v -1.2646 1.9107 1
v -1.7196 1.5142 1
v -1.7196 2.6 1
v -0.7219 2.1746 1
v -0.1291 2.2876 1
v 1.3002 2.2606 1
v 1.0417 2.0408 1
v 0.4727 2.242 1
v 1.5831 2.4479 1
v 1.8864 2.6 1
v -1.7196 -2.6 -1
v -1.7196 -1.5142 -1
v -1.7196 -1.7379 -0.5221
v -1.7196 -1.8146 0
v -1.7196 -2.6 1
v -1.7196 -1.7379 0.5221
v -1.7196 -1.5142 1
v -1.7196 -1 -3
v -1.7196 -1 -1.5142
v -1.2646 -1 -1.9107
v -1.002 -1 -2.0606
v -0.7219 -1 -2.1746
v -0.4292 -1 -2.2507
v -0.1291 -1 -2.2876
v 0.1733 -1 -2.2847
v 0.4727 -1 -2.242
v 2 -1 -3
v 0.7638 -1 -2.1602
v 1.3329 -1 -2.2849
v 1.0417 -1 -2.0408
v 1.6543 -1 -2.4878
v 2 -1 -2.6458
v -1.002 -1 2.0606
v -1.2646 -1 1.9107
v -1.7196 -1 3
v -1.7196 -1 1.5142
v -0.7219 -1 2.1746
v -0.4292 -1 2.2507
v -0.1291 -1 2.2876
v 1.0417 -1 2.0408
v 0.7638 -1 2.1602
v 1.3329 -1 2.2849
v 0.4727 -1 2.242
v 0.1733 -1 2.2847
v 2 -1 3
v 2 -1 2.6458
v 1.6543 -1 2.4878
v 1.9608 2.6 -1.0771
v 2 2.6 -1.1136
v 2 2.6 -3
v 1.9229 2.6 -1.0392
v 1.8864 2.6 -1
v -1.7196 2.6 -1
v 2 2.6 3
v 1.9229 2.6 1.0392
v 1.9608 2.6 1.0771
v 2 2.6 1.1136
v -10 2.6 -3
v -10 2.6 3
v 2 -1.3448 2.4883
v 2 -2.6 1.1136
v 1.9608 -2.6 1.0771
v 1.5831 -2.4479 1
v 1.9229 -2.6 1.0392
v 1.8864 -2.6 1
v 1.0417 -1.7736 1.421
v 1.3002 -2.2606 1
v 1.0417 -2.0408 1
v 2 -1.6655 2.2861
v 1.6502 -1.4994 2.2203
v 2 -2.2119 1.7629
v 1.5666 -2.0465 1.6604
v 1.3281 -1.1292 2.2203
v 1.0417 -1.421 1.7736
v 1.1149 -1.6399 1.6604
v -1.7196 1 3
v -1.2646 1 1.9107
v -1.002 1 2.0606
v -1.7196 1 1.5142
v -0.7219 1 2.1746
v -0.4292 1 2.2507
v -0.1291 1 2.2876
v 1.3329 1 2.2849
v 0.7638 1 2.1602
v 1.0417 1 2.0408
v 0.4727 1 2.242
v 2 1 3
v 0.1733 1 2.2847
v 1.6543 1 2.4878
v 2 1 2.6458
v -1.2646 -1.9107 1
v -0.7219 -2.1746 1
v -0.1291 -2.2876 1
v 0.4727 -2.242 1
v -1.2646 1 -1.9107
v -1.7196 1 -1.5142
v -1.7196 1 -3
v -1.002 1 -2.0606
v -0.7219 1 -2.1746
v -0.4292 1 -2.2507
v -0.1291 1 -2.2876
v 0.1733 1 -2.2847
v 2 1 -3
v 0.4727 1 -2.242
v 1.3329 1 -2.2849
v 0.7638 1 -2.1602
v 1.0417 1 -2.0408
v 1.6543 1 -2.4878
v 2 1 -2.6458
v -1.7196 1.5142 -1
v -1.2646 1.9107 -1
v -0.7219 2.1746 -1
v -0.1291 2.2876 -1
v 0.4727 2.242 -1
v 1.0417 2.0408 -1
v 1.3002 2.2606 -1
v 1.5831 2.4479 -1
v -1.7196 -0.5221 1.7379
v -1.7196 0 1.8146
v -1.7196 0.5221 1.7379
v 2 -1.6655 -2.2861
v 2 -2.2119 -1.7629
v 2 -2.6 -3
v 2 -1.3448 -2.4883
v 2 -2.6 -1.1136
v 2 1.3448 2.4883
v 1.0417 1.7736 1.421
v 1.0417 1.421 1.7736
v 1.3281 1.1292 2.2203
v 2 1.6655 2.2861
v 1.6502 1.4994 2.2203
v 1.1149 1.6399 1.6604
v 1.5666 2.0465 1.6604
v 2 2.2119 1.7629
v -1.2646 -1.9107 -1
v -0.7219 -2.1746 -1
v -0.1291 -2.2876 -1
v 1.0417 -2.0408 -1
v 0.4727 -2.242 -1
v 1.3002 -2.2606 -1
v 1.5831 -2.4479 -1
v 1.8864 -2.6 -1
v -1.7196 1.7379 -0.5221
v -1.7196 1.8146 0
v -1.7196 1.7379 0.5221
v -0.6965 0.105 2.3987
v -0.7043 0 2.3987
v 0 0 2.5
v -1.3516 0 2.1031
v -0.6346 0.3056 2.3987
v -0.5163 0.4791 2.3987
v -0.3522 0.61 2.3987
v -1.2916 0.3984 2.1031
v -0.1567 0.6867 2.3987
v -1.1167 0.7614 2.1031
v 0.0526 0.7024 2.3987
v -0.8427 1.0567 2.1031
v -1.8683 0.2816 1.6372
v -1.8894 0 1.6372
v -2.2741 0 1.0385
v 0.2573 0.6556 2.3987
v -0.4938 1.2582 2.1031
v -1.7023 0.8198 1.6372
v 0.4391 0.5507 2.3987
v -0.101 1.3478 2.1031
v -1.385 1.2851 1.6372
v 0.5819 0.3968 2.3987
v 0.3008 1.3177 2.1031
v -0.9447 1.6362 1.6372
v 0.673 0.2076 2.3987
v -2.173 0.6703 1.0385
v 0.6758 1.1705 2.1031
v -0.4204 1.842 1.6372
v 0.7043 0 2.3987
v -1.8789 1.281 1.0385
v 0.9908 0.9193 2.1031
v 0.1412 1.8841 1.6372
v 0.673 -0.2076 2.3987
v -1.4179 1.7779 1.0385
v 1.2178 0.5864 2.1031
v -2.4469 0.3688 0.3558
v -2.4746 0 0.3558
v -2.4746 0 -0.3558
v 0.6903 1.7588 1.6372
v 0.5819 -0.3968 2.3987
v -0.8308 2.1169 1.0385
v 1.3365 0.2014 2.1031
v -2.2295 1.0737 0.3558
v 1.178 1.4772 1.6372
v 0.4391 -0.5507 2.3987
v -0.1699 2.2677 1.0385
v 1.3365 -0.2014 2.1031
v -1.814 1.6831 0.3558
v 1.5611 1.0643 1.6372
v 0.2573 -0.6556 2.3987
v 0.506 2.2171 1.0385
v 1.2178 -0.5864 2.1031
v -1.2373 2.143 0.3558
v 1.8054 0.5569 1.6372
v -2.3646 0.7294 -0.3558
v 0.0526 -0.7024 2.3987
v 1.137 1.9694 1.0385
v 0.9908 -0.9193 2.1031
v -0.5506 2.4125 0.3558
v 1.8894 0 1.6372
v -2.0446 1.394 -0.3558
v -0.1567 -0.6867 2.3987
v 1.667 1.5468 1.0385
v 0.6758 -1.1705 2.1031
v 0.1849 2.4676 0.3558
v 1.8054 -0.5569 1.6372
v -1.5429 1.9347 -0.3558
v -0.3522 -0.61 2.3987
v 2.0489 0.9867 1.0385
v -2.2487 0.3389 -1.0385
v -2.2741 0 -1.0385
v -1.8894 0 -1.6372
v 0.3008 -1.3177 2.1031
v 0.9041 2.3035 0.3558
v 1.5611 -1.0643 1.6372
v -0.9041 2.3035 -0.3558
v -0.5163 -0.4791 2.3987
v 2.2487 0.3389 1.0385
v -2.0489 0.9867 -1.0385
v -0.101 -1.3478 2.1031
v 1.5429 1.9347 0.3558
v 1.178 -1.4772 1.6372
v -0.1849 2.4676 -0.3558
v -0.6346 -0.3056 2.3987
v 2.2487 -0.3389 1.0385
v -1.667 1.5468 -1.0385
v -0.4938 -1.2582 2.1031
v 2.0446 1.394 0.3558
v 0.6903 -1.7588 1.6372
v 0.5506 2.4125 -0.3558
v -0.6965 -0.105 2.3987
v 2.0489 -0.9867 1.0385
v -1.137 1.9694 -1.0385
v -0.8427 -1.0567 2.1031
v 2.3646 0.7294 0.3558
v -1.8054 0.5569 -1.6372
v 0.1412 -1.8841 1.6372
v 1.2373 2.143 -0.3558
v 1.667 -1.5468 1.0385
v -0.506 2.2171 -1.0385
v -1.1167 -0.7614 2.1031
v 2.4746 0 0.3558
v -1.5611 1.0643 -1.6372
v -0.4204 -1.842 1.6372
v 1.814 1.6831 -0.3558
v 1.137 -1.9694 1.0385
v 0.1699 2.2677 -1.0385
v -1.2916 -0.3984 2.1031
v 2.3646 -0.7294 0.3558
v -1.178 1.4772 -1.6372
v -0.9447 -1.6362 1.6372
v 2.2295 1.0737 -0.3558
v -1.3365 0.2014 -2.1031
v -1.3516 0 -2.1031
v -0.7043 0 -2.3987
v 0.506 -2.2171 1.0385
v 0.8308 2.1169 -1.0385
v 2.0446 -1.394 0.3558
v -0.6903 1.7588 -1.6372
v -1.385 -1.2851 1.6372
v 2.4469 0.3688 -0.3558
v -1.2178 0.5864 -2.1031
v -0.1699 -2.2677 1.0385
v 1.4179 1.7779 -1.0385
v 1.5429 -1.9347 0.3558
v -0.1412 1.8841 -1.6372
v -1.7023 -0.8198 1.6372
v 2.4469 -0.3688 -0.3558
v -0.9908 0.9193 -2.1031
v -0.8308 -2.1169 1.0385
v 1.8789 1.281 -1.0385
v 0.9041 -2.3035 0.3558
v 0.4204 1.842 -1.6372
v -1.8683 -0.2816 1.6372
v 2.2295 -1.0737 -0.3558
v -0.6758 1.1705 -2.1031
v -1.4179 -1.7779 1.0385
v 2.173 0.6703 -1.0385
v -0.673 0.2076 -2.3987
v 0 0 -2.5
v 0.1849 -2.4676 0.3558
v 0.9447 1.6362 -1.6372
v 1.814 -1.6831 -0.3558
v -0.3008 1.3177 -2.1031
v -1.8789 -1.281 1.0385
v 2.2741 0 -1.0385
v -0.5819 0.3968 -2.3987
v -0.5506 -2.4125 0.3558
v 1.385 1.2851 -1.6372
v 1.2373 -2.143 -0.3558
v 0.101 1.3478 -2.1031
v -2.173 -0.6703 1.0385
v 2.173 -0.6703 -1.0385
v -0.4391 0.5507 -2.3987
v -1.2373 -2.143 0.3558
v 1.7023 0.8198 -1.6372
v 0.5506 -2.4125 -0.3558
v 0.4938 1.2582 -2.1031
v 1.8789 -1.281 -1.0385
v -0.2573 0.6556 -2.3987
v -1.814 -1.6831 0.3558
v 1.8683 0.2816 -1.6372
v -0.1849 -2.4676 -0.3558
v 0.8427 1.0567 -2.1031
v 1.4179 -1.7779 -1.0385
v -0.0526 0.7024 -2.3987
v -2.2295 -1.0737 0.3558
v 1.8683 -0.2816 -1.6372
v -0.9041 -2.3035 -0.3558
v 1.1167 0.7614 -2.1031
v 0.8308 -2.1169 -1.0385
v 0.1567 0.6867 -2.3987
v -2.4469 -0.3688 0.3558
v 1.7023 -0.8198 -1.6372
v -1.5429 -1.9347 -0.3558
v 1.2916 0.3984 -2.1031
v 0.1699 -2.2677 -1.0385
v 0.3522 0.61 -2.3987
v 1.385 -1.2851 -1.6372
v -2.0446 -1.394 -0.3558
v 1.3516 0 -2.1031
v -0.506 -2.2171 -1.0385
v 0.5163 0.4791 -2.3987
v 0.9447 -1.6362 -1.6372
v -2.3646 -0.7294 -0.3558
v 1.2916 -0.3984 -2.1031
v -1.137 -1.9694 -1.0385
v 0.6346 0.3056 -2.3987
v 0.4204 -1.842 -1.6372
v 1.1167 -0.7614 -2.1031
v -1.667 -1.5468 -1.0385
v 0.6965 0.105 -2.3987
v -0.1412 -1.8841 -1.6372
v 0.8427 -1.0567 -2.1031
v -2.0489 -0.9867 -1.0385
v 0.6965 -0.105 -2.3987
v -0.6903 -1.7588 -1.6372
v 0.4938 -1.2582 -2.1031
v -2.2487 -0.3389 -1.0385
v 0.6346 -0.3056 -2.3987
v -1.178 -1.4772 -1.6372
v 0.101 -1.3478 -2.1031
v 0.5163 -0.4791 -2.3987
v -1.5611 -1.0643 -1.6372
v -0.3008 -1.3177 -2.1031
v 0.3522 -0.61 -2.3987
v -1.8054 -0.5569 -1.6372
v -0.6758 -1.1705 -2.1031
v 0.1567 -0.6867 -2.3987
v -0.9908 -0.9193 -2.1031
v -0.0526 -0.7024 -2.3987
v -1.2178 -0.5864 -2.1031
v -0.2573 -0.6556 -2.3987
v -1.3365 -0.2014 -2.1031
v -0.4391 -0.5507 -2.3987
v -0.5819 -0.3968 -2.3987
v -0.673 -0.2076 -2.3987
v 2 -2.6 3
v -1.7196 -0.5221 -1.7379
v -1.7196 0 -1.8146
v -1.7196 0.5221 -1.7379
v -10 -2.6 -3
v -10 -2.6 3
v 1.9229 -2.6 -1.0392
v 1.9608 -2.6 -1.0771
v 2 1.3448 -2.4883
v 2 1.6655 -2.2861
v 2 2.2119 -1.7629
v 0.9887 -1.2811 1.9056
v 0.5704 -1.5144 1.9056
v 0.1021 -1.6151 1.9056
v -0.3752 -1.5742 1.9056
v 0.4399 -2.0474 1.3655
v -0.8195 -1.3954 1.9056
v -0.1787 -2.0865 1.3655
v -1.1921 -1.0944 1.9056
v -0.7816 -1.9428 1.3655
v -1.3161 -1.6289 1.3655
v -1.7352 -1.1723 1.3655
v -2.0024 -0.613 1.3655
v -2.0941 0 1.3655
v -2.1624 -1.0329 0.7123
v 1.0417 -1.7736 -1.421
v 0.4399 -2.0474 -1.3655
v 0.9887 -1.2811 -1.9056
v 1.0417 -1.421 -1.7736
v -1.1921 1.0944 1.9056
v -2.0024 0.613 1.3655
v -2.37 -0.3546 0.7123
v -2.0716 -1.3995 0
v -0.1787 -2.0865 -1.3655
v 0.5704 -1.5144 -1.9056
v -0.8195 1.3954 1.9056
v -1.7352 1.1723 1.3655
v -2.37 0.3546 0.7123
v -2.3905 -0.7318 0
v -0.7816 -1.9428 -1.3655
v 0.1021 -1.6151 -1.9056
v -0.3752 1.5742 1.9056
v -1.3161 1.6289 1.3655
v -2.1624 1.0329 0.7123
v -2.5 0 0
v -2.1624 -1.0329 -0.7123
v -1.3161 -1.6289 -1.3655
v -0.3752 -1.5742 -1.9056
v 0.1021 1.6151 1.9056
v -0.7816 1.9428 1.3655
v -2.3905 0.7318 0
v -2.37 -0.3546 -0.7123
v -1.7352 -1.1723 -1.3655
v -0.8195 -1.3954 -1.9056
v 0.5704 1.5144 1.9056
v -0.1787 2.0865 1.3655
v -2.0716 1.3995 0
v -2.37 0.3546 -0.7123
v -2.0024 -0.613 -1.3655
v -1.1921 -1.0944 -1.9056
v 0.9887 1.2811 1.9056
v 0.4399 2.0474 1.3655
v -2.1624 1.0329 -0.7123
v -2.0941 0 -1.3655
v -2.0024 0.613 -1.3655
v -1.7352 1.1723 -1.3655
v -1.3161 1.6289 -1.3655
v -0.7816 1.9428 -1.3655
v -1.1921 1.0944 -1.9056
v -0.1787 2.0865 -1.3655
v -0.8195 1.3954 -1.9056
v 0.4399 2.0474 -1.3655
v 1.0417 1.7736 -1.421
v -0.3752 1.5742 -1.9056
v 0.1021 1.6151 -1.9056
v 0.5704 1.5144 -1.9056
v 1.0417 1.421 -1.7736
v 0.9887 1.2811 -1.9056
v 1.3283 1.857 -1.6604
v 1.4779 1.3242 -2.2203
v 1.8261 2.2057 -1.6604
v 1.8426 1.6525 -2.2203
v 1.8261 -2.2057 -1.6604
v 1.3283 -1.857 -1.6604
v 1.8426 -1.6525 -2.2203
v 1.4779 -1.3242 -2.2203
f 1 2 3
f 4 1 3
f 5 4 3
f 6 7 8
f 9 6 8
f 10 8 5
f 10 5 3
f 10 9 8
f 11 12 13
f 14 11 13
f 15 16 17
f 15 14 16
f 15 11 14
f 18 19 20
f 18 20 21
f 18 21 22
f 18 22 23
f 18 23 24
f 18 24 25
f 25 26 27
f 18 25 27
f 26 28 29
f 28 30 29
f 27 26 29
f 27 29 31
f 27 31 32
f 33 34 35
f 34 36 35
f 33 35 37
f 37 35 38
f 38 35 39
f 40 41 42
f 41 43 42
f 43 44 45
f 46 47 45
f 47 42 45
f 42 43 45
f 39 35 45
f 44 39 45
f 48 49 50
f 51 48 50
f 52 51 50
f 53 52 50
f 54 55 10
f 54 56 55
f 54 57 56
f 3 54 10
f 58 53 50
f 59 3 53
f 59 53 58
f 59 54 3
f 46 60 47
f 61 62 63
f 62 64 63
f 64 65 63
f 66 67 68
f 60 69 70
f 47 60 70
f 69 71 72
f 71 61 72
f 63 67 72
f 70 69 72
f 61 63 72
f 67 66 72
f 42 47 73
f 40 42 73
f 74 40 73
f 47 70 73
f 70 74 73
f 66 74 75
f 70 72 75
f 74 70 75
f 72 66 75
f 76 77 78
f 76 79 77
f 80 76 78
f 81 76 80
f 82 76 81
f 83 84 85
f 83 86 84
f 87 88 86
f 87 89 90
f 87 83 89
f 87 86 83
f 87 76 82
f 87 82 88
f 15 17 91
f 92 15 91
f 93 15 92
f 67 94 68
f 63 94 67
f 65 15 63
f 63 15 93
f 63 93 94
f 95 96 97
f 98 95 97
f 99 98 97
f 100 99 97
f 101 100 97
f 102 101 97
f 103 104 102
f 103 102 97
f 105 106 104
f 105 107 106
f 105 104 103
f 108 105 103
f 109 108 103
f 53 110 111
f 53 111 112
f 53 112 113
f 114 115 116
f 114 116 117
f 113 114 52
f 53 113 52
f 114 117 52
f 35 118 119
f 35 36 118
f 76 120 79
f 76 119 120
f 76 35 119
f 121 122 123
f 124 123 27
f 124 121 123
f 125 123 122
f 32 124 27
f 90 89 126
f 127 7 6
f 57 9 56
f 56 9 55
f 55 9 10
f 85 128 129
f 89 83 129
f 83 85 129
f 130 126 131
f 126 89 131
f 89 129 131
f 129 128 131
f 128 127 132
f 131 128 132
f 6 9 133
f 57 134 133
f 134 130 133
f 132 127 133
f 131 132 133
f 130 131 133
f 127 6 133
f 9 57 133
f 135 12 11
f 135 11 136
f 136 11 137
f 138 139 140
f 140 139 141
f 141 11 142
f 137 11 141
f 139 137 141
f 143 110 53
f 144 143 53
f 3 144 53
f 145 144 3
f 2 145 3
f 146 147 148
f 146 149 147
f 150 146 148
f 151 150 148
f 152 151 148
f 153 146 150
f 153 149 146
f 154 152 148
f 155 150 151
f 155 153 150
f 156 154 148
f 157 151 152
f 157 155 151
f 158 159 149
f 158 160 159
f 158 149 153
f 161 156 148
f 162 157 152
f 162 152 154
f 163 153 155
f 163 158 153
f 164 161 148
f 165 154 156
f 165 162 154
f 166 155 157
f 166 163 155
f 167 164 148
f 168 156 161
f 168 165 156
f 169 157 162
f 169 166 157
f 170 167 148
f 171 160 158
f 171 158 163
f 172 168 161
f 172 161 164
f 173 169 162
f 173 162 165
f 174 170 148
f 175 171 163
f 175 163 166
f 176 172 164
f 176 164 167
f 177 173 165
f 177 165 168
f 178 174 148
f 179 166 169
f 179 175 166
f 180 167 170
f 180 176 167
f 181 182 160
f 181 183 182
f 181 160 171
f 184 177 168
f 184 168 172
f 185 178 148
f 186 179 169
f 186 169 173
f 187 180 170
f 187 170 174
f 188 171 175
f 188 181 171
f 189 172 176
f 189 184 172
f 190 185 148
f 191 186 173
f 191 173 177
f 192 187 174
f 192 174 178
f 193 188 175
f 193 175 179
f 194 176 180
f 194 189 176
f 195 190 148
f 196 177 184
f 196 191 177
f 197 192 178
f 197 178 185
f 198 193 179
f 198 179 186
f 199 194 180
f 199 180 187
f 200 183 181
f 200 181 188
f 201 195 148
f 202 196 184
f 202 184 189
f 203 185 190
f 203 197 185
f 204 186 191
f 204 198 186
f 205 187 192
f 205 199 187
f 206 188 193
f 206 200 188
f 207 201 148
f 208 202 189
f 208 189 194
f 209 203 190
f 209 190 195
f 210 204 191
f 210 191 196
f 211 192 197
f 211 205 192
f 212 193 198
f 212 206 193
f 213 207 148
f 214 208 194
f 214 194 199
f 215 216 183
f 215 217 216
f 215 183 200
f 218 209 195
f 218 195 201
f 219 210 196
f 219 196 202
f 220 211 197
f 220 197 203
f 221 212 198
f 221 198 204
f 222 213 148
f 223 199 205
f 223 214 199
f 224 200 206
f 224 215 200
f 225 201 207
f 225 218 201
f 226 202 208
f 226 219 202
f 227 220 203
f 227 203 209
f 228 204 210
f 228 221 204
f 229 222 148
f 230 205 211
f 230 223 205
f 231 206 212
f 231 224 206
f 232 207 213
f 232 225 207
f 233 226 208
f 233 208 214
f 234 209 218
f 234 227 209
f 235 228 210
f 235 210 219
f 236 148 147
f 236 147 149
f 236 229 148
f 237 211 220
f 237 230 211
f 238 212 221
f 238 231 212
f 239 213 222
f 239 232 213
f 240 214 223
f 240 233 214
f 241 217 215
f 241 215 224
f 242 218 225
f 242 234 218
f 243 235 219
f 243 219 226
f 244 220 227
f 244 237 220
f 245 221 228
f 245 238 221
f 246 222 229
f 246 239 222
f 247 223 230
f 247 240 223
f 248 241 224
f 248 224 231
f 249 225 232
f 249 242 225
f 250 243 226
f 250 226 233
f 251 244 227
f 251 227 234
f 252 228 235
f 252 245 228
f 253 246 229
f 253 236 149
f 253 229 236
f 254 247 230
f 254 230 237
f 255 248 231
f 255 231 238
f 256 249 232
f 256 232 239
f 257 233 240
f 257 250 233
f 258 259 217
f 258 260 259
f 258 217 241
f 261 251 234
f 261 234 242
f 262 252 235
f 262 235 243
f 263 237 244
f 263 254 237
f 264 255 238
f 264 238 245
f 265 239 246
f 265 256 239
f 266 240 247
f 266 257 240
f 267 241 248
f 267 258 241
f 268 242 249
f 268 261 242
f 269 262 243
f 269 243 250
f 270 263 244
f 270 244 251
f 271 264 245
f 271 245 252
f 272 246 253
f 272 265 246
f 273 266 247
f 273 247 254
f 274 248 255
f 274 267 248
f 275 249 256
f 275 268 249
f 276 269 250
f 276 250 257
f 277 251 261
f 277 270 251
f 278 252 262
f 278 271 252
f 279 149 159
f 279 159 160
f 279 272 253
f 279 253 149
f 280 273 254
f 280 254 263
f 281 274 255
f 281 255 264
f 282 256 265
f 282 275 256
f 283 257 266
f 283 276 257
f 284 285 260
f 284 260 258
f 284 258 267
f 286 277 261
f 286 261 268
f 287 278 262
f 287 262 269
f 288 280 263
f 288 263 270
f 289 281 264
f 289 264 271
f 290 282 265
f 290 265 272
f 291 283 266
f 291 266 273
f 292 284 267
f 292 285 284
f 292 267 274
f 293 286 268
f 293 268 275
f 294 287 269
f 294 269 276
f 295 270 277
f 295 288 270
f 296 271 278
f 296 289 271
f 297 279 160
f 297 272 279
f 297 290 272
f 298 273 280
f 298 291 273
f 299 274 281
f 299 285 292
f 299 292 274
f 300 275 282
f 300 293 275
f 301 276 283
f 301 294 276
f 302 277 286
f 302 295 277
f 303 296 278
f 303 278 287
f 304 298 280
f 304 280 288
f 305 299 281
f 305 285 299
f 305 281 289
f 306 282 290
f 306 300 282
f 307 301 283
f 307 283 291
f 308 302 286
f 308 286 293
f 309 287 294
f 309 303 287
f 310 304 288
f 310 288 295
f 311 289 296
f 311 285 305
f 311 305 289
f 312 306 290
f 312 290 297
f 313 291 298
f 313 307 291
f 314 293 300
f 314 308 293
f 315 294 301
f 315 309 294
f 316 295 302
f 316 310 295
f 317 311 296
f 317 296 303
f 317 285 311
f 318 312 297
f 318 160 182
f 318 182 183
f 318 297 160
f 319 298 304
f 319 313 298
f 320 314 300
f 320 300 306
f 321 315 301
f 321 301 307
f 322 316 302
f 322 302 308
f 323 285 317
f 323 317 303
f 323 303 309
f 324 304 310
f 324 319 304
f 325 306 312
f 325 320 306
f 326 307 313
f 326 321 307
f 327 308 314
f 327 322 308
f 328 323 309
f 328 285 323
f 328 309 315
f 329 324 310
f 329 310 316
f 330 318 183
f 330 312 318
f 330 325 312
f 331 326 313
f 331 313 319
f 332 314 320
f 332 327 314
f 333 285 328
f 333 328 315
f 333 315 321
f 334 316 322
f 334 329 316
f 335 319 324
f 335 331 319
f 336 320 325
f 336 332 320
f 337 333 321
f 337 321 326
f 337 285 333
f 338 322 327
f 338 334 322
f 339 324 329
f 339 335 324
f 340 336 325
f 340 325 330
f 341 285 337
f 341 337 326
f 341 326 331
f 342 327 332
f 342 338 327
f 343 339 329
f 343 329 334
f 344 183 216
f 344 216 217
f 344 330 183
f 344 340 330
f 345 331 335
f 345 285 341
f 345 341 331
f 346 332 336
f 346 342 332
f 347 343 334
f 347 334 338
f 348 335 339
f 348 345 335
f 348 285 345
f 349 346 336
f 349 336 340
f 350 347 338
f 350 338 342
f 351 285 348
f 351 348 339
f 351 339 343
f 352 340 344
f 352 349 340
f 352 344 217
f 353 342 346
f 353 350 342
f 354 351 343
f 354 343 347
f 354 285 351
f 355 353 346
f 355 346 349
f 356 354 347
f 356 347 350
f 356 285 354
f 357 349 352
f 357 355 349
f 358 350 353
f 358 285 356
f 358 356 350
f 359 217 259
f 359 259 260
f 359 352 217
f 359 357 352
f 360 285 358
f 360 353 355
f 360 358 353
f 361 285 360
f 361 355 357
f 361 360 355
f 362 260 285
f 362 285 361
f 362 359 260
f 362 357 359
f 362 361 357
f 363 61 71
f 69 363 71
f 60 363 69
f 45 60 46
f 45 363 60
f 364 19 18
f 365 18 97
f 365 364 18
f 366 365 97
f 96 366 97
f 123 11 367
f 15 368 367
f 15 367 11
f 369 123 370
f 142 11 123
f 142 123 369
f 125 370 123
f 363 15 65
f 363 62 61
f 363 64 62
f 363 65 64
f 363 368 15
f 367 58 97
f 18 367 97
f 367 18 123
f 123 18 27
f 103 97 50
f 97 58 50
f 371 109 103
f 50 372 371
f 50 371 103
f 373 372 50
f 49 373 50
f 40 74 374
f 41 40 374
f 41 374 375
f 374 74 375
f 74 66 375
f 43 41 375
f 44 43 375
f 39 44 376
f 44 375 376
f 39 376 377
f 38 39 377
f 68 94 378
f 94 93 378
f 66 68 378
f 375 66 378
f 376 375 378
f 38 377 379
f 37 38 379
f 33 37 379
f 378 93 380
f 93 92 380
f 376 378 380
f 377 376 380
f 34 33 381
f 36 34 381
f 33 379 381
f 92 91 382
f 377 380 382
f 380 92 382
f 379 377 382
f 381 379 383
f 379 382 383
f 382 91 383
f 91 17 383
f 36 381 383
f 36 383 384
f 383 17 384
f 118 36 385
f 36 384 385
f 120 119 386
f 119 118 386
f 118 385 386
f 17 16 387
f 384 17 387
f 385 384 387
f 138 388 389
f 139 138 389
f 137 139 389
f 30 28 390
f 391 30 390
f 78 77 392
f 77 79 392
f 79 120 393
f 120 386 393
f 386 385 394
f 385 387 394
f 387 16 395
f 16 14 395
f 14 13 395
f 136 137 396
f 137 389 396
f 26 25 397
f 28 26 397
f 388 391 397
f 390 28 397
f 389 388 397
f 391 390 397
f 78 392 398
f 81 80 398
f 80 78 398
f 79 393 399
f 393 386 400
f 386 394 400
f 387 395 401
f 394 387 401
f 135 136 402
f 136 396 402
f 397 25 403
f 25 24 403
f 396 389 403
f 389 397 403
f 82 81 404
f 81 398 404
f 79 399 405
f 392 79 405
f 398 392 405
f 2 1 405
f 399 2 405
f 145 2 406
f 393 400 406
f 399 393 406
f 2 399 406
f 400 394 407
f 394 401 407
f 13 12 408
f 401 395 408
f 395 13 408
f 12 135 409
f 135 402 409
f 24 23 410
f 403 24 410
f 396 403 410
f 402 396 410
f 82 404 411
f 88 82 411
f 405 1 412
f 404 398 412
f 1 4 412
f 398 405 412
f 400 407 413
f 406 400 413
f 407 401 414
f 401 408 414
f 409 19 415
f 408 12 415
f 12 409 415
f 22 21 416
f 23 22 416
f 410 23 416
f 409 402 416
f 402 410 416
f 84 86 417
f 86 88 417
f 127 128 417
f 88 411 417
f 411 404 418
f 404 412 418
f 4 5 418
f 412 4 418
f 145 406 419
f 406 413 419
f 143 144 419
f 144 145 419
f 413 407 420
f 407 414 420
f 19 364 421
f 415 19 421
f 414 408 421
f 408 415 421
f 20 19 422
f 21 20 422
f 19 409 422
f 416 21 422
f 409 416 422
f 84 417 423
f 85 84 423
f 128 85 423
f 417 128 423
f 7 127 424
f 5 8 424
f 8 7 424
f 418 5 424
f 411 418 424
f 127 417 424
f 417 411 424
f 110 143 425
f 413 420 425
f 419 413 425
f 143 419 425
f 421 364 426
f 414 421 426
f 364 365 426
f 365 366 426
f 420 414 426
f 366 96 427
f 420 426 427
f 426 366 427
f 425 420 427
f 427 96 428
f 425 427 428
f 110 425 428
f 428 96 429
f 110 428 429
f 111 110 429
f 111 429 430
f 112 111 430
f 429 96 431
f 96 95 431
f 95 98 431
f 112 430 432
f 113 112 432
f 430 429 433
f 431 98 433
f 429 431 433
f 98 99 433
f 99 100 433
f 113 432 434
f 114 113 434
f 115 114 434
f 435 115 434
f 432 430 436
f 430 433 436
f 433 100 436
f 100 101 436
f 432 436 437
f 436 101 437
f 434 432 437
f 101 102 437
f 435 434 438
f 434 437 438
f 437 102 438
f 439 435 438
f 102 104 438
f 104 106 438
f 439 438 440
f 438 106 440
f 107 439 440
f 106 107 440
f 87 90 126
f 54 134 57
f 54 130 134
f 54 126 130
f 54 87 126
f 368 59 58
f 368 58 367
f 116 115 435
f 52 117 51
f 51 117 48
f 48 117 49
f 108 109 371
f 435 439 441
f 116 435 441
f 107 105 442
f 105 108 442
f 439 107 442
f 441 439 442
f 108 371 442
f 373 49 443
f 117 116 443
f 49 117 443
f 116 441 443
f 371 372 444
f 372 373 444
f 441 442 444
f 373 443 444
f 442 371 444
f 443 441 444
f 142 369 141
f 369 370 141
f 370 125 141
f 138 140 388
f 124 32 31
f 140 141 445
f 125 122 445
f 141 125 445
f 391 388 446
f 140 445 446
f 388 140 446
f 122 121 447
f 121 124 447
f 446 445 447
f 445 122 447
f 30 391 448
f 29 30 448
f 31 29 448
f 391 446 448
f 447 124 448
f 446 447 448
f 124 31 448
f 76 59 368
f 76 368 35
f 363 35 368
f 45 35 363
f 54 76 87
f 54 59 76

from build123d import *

# Parameters (mm, degrees)
F3_DEPTH  = 3
F5_W      = 4.2196343979
F5_H      = 2
F6_DEPTH  = 4
F7_ANGLE  = 90
F10_SCALE = 1.2


with BuildPart() as f1:
    # F0 (on Front) → F1 (revolve)
    with BuildSketch(Plane.XZ):
        with BuildLine():
            Line((0, -2.5), (0, 2.5))
            ThreePointArc((0, 2.5), (-2.5, 0), (0, -2.5))
        make_face()
    revolve(axis=Axis((0, 0, 0), (0, 0, -1)))


with BuildPart() as f3:
    # F2 (on Top) → F3 (new body, symmetric)
    with BuildSketch(Plane.XY):
        Polygon((2, 0), (2, 2.6), (-10, 2.6), (-10, 0), (-10, -2.6), (2, -2.6), align=None)
    extrude(amount=F3_DEPTH, both=True)

    # F4: cut F1
    add(f1.part, mode=Mode.SUBTRACT)


with BuildPart() as f6:
    # F5 (on Top) → F6 (new body, symmetric)
    with BuildSketch(Plane.XY):
        with Locations((0.3901828011, 0)):
            Rectangle(F5_W, F5_H)
    extrude(amount=F6_DEPTH, both=True)


with BuildPart() as f7_1:
    # F7: copy of F6
    add(f6.part.rotate(Axis((0.3765770234, 0, 0), (1, 0, 0)), F7_ANGLE))


with BuildPart() as f3_1:
    add(f3.part)

    # F8: cut F7_1
    add(f7_1.part, mode=Mode.SUBTRACT)

    # F9: cut F6
    add(f6.part, mode=Mode.SUBTRACT)


with BuildPart() as f10_1:
    # F10: copy of F1
    add(f1.part.scale(F10_SCALE))


with BuildPart() as f10_1_1:
    # F11: moved
    add(f10_1.part.moved(Location((3, 0, 0))))


with BuildPart() as f3_2:
    add(f3_1.part)

    # F12: cut F10_1
    add(f10_1_1.part, mode=Mode.SUBTRACT)


solid = Compound([f1.part, f3_2.part])
